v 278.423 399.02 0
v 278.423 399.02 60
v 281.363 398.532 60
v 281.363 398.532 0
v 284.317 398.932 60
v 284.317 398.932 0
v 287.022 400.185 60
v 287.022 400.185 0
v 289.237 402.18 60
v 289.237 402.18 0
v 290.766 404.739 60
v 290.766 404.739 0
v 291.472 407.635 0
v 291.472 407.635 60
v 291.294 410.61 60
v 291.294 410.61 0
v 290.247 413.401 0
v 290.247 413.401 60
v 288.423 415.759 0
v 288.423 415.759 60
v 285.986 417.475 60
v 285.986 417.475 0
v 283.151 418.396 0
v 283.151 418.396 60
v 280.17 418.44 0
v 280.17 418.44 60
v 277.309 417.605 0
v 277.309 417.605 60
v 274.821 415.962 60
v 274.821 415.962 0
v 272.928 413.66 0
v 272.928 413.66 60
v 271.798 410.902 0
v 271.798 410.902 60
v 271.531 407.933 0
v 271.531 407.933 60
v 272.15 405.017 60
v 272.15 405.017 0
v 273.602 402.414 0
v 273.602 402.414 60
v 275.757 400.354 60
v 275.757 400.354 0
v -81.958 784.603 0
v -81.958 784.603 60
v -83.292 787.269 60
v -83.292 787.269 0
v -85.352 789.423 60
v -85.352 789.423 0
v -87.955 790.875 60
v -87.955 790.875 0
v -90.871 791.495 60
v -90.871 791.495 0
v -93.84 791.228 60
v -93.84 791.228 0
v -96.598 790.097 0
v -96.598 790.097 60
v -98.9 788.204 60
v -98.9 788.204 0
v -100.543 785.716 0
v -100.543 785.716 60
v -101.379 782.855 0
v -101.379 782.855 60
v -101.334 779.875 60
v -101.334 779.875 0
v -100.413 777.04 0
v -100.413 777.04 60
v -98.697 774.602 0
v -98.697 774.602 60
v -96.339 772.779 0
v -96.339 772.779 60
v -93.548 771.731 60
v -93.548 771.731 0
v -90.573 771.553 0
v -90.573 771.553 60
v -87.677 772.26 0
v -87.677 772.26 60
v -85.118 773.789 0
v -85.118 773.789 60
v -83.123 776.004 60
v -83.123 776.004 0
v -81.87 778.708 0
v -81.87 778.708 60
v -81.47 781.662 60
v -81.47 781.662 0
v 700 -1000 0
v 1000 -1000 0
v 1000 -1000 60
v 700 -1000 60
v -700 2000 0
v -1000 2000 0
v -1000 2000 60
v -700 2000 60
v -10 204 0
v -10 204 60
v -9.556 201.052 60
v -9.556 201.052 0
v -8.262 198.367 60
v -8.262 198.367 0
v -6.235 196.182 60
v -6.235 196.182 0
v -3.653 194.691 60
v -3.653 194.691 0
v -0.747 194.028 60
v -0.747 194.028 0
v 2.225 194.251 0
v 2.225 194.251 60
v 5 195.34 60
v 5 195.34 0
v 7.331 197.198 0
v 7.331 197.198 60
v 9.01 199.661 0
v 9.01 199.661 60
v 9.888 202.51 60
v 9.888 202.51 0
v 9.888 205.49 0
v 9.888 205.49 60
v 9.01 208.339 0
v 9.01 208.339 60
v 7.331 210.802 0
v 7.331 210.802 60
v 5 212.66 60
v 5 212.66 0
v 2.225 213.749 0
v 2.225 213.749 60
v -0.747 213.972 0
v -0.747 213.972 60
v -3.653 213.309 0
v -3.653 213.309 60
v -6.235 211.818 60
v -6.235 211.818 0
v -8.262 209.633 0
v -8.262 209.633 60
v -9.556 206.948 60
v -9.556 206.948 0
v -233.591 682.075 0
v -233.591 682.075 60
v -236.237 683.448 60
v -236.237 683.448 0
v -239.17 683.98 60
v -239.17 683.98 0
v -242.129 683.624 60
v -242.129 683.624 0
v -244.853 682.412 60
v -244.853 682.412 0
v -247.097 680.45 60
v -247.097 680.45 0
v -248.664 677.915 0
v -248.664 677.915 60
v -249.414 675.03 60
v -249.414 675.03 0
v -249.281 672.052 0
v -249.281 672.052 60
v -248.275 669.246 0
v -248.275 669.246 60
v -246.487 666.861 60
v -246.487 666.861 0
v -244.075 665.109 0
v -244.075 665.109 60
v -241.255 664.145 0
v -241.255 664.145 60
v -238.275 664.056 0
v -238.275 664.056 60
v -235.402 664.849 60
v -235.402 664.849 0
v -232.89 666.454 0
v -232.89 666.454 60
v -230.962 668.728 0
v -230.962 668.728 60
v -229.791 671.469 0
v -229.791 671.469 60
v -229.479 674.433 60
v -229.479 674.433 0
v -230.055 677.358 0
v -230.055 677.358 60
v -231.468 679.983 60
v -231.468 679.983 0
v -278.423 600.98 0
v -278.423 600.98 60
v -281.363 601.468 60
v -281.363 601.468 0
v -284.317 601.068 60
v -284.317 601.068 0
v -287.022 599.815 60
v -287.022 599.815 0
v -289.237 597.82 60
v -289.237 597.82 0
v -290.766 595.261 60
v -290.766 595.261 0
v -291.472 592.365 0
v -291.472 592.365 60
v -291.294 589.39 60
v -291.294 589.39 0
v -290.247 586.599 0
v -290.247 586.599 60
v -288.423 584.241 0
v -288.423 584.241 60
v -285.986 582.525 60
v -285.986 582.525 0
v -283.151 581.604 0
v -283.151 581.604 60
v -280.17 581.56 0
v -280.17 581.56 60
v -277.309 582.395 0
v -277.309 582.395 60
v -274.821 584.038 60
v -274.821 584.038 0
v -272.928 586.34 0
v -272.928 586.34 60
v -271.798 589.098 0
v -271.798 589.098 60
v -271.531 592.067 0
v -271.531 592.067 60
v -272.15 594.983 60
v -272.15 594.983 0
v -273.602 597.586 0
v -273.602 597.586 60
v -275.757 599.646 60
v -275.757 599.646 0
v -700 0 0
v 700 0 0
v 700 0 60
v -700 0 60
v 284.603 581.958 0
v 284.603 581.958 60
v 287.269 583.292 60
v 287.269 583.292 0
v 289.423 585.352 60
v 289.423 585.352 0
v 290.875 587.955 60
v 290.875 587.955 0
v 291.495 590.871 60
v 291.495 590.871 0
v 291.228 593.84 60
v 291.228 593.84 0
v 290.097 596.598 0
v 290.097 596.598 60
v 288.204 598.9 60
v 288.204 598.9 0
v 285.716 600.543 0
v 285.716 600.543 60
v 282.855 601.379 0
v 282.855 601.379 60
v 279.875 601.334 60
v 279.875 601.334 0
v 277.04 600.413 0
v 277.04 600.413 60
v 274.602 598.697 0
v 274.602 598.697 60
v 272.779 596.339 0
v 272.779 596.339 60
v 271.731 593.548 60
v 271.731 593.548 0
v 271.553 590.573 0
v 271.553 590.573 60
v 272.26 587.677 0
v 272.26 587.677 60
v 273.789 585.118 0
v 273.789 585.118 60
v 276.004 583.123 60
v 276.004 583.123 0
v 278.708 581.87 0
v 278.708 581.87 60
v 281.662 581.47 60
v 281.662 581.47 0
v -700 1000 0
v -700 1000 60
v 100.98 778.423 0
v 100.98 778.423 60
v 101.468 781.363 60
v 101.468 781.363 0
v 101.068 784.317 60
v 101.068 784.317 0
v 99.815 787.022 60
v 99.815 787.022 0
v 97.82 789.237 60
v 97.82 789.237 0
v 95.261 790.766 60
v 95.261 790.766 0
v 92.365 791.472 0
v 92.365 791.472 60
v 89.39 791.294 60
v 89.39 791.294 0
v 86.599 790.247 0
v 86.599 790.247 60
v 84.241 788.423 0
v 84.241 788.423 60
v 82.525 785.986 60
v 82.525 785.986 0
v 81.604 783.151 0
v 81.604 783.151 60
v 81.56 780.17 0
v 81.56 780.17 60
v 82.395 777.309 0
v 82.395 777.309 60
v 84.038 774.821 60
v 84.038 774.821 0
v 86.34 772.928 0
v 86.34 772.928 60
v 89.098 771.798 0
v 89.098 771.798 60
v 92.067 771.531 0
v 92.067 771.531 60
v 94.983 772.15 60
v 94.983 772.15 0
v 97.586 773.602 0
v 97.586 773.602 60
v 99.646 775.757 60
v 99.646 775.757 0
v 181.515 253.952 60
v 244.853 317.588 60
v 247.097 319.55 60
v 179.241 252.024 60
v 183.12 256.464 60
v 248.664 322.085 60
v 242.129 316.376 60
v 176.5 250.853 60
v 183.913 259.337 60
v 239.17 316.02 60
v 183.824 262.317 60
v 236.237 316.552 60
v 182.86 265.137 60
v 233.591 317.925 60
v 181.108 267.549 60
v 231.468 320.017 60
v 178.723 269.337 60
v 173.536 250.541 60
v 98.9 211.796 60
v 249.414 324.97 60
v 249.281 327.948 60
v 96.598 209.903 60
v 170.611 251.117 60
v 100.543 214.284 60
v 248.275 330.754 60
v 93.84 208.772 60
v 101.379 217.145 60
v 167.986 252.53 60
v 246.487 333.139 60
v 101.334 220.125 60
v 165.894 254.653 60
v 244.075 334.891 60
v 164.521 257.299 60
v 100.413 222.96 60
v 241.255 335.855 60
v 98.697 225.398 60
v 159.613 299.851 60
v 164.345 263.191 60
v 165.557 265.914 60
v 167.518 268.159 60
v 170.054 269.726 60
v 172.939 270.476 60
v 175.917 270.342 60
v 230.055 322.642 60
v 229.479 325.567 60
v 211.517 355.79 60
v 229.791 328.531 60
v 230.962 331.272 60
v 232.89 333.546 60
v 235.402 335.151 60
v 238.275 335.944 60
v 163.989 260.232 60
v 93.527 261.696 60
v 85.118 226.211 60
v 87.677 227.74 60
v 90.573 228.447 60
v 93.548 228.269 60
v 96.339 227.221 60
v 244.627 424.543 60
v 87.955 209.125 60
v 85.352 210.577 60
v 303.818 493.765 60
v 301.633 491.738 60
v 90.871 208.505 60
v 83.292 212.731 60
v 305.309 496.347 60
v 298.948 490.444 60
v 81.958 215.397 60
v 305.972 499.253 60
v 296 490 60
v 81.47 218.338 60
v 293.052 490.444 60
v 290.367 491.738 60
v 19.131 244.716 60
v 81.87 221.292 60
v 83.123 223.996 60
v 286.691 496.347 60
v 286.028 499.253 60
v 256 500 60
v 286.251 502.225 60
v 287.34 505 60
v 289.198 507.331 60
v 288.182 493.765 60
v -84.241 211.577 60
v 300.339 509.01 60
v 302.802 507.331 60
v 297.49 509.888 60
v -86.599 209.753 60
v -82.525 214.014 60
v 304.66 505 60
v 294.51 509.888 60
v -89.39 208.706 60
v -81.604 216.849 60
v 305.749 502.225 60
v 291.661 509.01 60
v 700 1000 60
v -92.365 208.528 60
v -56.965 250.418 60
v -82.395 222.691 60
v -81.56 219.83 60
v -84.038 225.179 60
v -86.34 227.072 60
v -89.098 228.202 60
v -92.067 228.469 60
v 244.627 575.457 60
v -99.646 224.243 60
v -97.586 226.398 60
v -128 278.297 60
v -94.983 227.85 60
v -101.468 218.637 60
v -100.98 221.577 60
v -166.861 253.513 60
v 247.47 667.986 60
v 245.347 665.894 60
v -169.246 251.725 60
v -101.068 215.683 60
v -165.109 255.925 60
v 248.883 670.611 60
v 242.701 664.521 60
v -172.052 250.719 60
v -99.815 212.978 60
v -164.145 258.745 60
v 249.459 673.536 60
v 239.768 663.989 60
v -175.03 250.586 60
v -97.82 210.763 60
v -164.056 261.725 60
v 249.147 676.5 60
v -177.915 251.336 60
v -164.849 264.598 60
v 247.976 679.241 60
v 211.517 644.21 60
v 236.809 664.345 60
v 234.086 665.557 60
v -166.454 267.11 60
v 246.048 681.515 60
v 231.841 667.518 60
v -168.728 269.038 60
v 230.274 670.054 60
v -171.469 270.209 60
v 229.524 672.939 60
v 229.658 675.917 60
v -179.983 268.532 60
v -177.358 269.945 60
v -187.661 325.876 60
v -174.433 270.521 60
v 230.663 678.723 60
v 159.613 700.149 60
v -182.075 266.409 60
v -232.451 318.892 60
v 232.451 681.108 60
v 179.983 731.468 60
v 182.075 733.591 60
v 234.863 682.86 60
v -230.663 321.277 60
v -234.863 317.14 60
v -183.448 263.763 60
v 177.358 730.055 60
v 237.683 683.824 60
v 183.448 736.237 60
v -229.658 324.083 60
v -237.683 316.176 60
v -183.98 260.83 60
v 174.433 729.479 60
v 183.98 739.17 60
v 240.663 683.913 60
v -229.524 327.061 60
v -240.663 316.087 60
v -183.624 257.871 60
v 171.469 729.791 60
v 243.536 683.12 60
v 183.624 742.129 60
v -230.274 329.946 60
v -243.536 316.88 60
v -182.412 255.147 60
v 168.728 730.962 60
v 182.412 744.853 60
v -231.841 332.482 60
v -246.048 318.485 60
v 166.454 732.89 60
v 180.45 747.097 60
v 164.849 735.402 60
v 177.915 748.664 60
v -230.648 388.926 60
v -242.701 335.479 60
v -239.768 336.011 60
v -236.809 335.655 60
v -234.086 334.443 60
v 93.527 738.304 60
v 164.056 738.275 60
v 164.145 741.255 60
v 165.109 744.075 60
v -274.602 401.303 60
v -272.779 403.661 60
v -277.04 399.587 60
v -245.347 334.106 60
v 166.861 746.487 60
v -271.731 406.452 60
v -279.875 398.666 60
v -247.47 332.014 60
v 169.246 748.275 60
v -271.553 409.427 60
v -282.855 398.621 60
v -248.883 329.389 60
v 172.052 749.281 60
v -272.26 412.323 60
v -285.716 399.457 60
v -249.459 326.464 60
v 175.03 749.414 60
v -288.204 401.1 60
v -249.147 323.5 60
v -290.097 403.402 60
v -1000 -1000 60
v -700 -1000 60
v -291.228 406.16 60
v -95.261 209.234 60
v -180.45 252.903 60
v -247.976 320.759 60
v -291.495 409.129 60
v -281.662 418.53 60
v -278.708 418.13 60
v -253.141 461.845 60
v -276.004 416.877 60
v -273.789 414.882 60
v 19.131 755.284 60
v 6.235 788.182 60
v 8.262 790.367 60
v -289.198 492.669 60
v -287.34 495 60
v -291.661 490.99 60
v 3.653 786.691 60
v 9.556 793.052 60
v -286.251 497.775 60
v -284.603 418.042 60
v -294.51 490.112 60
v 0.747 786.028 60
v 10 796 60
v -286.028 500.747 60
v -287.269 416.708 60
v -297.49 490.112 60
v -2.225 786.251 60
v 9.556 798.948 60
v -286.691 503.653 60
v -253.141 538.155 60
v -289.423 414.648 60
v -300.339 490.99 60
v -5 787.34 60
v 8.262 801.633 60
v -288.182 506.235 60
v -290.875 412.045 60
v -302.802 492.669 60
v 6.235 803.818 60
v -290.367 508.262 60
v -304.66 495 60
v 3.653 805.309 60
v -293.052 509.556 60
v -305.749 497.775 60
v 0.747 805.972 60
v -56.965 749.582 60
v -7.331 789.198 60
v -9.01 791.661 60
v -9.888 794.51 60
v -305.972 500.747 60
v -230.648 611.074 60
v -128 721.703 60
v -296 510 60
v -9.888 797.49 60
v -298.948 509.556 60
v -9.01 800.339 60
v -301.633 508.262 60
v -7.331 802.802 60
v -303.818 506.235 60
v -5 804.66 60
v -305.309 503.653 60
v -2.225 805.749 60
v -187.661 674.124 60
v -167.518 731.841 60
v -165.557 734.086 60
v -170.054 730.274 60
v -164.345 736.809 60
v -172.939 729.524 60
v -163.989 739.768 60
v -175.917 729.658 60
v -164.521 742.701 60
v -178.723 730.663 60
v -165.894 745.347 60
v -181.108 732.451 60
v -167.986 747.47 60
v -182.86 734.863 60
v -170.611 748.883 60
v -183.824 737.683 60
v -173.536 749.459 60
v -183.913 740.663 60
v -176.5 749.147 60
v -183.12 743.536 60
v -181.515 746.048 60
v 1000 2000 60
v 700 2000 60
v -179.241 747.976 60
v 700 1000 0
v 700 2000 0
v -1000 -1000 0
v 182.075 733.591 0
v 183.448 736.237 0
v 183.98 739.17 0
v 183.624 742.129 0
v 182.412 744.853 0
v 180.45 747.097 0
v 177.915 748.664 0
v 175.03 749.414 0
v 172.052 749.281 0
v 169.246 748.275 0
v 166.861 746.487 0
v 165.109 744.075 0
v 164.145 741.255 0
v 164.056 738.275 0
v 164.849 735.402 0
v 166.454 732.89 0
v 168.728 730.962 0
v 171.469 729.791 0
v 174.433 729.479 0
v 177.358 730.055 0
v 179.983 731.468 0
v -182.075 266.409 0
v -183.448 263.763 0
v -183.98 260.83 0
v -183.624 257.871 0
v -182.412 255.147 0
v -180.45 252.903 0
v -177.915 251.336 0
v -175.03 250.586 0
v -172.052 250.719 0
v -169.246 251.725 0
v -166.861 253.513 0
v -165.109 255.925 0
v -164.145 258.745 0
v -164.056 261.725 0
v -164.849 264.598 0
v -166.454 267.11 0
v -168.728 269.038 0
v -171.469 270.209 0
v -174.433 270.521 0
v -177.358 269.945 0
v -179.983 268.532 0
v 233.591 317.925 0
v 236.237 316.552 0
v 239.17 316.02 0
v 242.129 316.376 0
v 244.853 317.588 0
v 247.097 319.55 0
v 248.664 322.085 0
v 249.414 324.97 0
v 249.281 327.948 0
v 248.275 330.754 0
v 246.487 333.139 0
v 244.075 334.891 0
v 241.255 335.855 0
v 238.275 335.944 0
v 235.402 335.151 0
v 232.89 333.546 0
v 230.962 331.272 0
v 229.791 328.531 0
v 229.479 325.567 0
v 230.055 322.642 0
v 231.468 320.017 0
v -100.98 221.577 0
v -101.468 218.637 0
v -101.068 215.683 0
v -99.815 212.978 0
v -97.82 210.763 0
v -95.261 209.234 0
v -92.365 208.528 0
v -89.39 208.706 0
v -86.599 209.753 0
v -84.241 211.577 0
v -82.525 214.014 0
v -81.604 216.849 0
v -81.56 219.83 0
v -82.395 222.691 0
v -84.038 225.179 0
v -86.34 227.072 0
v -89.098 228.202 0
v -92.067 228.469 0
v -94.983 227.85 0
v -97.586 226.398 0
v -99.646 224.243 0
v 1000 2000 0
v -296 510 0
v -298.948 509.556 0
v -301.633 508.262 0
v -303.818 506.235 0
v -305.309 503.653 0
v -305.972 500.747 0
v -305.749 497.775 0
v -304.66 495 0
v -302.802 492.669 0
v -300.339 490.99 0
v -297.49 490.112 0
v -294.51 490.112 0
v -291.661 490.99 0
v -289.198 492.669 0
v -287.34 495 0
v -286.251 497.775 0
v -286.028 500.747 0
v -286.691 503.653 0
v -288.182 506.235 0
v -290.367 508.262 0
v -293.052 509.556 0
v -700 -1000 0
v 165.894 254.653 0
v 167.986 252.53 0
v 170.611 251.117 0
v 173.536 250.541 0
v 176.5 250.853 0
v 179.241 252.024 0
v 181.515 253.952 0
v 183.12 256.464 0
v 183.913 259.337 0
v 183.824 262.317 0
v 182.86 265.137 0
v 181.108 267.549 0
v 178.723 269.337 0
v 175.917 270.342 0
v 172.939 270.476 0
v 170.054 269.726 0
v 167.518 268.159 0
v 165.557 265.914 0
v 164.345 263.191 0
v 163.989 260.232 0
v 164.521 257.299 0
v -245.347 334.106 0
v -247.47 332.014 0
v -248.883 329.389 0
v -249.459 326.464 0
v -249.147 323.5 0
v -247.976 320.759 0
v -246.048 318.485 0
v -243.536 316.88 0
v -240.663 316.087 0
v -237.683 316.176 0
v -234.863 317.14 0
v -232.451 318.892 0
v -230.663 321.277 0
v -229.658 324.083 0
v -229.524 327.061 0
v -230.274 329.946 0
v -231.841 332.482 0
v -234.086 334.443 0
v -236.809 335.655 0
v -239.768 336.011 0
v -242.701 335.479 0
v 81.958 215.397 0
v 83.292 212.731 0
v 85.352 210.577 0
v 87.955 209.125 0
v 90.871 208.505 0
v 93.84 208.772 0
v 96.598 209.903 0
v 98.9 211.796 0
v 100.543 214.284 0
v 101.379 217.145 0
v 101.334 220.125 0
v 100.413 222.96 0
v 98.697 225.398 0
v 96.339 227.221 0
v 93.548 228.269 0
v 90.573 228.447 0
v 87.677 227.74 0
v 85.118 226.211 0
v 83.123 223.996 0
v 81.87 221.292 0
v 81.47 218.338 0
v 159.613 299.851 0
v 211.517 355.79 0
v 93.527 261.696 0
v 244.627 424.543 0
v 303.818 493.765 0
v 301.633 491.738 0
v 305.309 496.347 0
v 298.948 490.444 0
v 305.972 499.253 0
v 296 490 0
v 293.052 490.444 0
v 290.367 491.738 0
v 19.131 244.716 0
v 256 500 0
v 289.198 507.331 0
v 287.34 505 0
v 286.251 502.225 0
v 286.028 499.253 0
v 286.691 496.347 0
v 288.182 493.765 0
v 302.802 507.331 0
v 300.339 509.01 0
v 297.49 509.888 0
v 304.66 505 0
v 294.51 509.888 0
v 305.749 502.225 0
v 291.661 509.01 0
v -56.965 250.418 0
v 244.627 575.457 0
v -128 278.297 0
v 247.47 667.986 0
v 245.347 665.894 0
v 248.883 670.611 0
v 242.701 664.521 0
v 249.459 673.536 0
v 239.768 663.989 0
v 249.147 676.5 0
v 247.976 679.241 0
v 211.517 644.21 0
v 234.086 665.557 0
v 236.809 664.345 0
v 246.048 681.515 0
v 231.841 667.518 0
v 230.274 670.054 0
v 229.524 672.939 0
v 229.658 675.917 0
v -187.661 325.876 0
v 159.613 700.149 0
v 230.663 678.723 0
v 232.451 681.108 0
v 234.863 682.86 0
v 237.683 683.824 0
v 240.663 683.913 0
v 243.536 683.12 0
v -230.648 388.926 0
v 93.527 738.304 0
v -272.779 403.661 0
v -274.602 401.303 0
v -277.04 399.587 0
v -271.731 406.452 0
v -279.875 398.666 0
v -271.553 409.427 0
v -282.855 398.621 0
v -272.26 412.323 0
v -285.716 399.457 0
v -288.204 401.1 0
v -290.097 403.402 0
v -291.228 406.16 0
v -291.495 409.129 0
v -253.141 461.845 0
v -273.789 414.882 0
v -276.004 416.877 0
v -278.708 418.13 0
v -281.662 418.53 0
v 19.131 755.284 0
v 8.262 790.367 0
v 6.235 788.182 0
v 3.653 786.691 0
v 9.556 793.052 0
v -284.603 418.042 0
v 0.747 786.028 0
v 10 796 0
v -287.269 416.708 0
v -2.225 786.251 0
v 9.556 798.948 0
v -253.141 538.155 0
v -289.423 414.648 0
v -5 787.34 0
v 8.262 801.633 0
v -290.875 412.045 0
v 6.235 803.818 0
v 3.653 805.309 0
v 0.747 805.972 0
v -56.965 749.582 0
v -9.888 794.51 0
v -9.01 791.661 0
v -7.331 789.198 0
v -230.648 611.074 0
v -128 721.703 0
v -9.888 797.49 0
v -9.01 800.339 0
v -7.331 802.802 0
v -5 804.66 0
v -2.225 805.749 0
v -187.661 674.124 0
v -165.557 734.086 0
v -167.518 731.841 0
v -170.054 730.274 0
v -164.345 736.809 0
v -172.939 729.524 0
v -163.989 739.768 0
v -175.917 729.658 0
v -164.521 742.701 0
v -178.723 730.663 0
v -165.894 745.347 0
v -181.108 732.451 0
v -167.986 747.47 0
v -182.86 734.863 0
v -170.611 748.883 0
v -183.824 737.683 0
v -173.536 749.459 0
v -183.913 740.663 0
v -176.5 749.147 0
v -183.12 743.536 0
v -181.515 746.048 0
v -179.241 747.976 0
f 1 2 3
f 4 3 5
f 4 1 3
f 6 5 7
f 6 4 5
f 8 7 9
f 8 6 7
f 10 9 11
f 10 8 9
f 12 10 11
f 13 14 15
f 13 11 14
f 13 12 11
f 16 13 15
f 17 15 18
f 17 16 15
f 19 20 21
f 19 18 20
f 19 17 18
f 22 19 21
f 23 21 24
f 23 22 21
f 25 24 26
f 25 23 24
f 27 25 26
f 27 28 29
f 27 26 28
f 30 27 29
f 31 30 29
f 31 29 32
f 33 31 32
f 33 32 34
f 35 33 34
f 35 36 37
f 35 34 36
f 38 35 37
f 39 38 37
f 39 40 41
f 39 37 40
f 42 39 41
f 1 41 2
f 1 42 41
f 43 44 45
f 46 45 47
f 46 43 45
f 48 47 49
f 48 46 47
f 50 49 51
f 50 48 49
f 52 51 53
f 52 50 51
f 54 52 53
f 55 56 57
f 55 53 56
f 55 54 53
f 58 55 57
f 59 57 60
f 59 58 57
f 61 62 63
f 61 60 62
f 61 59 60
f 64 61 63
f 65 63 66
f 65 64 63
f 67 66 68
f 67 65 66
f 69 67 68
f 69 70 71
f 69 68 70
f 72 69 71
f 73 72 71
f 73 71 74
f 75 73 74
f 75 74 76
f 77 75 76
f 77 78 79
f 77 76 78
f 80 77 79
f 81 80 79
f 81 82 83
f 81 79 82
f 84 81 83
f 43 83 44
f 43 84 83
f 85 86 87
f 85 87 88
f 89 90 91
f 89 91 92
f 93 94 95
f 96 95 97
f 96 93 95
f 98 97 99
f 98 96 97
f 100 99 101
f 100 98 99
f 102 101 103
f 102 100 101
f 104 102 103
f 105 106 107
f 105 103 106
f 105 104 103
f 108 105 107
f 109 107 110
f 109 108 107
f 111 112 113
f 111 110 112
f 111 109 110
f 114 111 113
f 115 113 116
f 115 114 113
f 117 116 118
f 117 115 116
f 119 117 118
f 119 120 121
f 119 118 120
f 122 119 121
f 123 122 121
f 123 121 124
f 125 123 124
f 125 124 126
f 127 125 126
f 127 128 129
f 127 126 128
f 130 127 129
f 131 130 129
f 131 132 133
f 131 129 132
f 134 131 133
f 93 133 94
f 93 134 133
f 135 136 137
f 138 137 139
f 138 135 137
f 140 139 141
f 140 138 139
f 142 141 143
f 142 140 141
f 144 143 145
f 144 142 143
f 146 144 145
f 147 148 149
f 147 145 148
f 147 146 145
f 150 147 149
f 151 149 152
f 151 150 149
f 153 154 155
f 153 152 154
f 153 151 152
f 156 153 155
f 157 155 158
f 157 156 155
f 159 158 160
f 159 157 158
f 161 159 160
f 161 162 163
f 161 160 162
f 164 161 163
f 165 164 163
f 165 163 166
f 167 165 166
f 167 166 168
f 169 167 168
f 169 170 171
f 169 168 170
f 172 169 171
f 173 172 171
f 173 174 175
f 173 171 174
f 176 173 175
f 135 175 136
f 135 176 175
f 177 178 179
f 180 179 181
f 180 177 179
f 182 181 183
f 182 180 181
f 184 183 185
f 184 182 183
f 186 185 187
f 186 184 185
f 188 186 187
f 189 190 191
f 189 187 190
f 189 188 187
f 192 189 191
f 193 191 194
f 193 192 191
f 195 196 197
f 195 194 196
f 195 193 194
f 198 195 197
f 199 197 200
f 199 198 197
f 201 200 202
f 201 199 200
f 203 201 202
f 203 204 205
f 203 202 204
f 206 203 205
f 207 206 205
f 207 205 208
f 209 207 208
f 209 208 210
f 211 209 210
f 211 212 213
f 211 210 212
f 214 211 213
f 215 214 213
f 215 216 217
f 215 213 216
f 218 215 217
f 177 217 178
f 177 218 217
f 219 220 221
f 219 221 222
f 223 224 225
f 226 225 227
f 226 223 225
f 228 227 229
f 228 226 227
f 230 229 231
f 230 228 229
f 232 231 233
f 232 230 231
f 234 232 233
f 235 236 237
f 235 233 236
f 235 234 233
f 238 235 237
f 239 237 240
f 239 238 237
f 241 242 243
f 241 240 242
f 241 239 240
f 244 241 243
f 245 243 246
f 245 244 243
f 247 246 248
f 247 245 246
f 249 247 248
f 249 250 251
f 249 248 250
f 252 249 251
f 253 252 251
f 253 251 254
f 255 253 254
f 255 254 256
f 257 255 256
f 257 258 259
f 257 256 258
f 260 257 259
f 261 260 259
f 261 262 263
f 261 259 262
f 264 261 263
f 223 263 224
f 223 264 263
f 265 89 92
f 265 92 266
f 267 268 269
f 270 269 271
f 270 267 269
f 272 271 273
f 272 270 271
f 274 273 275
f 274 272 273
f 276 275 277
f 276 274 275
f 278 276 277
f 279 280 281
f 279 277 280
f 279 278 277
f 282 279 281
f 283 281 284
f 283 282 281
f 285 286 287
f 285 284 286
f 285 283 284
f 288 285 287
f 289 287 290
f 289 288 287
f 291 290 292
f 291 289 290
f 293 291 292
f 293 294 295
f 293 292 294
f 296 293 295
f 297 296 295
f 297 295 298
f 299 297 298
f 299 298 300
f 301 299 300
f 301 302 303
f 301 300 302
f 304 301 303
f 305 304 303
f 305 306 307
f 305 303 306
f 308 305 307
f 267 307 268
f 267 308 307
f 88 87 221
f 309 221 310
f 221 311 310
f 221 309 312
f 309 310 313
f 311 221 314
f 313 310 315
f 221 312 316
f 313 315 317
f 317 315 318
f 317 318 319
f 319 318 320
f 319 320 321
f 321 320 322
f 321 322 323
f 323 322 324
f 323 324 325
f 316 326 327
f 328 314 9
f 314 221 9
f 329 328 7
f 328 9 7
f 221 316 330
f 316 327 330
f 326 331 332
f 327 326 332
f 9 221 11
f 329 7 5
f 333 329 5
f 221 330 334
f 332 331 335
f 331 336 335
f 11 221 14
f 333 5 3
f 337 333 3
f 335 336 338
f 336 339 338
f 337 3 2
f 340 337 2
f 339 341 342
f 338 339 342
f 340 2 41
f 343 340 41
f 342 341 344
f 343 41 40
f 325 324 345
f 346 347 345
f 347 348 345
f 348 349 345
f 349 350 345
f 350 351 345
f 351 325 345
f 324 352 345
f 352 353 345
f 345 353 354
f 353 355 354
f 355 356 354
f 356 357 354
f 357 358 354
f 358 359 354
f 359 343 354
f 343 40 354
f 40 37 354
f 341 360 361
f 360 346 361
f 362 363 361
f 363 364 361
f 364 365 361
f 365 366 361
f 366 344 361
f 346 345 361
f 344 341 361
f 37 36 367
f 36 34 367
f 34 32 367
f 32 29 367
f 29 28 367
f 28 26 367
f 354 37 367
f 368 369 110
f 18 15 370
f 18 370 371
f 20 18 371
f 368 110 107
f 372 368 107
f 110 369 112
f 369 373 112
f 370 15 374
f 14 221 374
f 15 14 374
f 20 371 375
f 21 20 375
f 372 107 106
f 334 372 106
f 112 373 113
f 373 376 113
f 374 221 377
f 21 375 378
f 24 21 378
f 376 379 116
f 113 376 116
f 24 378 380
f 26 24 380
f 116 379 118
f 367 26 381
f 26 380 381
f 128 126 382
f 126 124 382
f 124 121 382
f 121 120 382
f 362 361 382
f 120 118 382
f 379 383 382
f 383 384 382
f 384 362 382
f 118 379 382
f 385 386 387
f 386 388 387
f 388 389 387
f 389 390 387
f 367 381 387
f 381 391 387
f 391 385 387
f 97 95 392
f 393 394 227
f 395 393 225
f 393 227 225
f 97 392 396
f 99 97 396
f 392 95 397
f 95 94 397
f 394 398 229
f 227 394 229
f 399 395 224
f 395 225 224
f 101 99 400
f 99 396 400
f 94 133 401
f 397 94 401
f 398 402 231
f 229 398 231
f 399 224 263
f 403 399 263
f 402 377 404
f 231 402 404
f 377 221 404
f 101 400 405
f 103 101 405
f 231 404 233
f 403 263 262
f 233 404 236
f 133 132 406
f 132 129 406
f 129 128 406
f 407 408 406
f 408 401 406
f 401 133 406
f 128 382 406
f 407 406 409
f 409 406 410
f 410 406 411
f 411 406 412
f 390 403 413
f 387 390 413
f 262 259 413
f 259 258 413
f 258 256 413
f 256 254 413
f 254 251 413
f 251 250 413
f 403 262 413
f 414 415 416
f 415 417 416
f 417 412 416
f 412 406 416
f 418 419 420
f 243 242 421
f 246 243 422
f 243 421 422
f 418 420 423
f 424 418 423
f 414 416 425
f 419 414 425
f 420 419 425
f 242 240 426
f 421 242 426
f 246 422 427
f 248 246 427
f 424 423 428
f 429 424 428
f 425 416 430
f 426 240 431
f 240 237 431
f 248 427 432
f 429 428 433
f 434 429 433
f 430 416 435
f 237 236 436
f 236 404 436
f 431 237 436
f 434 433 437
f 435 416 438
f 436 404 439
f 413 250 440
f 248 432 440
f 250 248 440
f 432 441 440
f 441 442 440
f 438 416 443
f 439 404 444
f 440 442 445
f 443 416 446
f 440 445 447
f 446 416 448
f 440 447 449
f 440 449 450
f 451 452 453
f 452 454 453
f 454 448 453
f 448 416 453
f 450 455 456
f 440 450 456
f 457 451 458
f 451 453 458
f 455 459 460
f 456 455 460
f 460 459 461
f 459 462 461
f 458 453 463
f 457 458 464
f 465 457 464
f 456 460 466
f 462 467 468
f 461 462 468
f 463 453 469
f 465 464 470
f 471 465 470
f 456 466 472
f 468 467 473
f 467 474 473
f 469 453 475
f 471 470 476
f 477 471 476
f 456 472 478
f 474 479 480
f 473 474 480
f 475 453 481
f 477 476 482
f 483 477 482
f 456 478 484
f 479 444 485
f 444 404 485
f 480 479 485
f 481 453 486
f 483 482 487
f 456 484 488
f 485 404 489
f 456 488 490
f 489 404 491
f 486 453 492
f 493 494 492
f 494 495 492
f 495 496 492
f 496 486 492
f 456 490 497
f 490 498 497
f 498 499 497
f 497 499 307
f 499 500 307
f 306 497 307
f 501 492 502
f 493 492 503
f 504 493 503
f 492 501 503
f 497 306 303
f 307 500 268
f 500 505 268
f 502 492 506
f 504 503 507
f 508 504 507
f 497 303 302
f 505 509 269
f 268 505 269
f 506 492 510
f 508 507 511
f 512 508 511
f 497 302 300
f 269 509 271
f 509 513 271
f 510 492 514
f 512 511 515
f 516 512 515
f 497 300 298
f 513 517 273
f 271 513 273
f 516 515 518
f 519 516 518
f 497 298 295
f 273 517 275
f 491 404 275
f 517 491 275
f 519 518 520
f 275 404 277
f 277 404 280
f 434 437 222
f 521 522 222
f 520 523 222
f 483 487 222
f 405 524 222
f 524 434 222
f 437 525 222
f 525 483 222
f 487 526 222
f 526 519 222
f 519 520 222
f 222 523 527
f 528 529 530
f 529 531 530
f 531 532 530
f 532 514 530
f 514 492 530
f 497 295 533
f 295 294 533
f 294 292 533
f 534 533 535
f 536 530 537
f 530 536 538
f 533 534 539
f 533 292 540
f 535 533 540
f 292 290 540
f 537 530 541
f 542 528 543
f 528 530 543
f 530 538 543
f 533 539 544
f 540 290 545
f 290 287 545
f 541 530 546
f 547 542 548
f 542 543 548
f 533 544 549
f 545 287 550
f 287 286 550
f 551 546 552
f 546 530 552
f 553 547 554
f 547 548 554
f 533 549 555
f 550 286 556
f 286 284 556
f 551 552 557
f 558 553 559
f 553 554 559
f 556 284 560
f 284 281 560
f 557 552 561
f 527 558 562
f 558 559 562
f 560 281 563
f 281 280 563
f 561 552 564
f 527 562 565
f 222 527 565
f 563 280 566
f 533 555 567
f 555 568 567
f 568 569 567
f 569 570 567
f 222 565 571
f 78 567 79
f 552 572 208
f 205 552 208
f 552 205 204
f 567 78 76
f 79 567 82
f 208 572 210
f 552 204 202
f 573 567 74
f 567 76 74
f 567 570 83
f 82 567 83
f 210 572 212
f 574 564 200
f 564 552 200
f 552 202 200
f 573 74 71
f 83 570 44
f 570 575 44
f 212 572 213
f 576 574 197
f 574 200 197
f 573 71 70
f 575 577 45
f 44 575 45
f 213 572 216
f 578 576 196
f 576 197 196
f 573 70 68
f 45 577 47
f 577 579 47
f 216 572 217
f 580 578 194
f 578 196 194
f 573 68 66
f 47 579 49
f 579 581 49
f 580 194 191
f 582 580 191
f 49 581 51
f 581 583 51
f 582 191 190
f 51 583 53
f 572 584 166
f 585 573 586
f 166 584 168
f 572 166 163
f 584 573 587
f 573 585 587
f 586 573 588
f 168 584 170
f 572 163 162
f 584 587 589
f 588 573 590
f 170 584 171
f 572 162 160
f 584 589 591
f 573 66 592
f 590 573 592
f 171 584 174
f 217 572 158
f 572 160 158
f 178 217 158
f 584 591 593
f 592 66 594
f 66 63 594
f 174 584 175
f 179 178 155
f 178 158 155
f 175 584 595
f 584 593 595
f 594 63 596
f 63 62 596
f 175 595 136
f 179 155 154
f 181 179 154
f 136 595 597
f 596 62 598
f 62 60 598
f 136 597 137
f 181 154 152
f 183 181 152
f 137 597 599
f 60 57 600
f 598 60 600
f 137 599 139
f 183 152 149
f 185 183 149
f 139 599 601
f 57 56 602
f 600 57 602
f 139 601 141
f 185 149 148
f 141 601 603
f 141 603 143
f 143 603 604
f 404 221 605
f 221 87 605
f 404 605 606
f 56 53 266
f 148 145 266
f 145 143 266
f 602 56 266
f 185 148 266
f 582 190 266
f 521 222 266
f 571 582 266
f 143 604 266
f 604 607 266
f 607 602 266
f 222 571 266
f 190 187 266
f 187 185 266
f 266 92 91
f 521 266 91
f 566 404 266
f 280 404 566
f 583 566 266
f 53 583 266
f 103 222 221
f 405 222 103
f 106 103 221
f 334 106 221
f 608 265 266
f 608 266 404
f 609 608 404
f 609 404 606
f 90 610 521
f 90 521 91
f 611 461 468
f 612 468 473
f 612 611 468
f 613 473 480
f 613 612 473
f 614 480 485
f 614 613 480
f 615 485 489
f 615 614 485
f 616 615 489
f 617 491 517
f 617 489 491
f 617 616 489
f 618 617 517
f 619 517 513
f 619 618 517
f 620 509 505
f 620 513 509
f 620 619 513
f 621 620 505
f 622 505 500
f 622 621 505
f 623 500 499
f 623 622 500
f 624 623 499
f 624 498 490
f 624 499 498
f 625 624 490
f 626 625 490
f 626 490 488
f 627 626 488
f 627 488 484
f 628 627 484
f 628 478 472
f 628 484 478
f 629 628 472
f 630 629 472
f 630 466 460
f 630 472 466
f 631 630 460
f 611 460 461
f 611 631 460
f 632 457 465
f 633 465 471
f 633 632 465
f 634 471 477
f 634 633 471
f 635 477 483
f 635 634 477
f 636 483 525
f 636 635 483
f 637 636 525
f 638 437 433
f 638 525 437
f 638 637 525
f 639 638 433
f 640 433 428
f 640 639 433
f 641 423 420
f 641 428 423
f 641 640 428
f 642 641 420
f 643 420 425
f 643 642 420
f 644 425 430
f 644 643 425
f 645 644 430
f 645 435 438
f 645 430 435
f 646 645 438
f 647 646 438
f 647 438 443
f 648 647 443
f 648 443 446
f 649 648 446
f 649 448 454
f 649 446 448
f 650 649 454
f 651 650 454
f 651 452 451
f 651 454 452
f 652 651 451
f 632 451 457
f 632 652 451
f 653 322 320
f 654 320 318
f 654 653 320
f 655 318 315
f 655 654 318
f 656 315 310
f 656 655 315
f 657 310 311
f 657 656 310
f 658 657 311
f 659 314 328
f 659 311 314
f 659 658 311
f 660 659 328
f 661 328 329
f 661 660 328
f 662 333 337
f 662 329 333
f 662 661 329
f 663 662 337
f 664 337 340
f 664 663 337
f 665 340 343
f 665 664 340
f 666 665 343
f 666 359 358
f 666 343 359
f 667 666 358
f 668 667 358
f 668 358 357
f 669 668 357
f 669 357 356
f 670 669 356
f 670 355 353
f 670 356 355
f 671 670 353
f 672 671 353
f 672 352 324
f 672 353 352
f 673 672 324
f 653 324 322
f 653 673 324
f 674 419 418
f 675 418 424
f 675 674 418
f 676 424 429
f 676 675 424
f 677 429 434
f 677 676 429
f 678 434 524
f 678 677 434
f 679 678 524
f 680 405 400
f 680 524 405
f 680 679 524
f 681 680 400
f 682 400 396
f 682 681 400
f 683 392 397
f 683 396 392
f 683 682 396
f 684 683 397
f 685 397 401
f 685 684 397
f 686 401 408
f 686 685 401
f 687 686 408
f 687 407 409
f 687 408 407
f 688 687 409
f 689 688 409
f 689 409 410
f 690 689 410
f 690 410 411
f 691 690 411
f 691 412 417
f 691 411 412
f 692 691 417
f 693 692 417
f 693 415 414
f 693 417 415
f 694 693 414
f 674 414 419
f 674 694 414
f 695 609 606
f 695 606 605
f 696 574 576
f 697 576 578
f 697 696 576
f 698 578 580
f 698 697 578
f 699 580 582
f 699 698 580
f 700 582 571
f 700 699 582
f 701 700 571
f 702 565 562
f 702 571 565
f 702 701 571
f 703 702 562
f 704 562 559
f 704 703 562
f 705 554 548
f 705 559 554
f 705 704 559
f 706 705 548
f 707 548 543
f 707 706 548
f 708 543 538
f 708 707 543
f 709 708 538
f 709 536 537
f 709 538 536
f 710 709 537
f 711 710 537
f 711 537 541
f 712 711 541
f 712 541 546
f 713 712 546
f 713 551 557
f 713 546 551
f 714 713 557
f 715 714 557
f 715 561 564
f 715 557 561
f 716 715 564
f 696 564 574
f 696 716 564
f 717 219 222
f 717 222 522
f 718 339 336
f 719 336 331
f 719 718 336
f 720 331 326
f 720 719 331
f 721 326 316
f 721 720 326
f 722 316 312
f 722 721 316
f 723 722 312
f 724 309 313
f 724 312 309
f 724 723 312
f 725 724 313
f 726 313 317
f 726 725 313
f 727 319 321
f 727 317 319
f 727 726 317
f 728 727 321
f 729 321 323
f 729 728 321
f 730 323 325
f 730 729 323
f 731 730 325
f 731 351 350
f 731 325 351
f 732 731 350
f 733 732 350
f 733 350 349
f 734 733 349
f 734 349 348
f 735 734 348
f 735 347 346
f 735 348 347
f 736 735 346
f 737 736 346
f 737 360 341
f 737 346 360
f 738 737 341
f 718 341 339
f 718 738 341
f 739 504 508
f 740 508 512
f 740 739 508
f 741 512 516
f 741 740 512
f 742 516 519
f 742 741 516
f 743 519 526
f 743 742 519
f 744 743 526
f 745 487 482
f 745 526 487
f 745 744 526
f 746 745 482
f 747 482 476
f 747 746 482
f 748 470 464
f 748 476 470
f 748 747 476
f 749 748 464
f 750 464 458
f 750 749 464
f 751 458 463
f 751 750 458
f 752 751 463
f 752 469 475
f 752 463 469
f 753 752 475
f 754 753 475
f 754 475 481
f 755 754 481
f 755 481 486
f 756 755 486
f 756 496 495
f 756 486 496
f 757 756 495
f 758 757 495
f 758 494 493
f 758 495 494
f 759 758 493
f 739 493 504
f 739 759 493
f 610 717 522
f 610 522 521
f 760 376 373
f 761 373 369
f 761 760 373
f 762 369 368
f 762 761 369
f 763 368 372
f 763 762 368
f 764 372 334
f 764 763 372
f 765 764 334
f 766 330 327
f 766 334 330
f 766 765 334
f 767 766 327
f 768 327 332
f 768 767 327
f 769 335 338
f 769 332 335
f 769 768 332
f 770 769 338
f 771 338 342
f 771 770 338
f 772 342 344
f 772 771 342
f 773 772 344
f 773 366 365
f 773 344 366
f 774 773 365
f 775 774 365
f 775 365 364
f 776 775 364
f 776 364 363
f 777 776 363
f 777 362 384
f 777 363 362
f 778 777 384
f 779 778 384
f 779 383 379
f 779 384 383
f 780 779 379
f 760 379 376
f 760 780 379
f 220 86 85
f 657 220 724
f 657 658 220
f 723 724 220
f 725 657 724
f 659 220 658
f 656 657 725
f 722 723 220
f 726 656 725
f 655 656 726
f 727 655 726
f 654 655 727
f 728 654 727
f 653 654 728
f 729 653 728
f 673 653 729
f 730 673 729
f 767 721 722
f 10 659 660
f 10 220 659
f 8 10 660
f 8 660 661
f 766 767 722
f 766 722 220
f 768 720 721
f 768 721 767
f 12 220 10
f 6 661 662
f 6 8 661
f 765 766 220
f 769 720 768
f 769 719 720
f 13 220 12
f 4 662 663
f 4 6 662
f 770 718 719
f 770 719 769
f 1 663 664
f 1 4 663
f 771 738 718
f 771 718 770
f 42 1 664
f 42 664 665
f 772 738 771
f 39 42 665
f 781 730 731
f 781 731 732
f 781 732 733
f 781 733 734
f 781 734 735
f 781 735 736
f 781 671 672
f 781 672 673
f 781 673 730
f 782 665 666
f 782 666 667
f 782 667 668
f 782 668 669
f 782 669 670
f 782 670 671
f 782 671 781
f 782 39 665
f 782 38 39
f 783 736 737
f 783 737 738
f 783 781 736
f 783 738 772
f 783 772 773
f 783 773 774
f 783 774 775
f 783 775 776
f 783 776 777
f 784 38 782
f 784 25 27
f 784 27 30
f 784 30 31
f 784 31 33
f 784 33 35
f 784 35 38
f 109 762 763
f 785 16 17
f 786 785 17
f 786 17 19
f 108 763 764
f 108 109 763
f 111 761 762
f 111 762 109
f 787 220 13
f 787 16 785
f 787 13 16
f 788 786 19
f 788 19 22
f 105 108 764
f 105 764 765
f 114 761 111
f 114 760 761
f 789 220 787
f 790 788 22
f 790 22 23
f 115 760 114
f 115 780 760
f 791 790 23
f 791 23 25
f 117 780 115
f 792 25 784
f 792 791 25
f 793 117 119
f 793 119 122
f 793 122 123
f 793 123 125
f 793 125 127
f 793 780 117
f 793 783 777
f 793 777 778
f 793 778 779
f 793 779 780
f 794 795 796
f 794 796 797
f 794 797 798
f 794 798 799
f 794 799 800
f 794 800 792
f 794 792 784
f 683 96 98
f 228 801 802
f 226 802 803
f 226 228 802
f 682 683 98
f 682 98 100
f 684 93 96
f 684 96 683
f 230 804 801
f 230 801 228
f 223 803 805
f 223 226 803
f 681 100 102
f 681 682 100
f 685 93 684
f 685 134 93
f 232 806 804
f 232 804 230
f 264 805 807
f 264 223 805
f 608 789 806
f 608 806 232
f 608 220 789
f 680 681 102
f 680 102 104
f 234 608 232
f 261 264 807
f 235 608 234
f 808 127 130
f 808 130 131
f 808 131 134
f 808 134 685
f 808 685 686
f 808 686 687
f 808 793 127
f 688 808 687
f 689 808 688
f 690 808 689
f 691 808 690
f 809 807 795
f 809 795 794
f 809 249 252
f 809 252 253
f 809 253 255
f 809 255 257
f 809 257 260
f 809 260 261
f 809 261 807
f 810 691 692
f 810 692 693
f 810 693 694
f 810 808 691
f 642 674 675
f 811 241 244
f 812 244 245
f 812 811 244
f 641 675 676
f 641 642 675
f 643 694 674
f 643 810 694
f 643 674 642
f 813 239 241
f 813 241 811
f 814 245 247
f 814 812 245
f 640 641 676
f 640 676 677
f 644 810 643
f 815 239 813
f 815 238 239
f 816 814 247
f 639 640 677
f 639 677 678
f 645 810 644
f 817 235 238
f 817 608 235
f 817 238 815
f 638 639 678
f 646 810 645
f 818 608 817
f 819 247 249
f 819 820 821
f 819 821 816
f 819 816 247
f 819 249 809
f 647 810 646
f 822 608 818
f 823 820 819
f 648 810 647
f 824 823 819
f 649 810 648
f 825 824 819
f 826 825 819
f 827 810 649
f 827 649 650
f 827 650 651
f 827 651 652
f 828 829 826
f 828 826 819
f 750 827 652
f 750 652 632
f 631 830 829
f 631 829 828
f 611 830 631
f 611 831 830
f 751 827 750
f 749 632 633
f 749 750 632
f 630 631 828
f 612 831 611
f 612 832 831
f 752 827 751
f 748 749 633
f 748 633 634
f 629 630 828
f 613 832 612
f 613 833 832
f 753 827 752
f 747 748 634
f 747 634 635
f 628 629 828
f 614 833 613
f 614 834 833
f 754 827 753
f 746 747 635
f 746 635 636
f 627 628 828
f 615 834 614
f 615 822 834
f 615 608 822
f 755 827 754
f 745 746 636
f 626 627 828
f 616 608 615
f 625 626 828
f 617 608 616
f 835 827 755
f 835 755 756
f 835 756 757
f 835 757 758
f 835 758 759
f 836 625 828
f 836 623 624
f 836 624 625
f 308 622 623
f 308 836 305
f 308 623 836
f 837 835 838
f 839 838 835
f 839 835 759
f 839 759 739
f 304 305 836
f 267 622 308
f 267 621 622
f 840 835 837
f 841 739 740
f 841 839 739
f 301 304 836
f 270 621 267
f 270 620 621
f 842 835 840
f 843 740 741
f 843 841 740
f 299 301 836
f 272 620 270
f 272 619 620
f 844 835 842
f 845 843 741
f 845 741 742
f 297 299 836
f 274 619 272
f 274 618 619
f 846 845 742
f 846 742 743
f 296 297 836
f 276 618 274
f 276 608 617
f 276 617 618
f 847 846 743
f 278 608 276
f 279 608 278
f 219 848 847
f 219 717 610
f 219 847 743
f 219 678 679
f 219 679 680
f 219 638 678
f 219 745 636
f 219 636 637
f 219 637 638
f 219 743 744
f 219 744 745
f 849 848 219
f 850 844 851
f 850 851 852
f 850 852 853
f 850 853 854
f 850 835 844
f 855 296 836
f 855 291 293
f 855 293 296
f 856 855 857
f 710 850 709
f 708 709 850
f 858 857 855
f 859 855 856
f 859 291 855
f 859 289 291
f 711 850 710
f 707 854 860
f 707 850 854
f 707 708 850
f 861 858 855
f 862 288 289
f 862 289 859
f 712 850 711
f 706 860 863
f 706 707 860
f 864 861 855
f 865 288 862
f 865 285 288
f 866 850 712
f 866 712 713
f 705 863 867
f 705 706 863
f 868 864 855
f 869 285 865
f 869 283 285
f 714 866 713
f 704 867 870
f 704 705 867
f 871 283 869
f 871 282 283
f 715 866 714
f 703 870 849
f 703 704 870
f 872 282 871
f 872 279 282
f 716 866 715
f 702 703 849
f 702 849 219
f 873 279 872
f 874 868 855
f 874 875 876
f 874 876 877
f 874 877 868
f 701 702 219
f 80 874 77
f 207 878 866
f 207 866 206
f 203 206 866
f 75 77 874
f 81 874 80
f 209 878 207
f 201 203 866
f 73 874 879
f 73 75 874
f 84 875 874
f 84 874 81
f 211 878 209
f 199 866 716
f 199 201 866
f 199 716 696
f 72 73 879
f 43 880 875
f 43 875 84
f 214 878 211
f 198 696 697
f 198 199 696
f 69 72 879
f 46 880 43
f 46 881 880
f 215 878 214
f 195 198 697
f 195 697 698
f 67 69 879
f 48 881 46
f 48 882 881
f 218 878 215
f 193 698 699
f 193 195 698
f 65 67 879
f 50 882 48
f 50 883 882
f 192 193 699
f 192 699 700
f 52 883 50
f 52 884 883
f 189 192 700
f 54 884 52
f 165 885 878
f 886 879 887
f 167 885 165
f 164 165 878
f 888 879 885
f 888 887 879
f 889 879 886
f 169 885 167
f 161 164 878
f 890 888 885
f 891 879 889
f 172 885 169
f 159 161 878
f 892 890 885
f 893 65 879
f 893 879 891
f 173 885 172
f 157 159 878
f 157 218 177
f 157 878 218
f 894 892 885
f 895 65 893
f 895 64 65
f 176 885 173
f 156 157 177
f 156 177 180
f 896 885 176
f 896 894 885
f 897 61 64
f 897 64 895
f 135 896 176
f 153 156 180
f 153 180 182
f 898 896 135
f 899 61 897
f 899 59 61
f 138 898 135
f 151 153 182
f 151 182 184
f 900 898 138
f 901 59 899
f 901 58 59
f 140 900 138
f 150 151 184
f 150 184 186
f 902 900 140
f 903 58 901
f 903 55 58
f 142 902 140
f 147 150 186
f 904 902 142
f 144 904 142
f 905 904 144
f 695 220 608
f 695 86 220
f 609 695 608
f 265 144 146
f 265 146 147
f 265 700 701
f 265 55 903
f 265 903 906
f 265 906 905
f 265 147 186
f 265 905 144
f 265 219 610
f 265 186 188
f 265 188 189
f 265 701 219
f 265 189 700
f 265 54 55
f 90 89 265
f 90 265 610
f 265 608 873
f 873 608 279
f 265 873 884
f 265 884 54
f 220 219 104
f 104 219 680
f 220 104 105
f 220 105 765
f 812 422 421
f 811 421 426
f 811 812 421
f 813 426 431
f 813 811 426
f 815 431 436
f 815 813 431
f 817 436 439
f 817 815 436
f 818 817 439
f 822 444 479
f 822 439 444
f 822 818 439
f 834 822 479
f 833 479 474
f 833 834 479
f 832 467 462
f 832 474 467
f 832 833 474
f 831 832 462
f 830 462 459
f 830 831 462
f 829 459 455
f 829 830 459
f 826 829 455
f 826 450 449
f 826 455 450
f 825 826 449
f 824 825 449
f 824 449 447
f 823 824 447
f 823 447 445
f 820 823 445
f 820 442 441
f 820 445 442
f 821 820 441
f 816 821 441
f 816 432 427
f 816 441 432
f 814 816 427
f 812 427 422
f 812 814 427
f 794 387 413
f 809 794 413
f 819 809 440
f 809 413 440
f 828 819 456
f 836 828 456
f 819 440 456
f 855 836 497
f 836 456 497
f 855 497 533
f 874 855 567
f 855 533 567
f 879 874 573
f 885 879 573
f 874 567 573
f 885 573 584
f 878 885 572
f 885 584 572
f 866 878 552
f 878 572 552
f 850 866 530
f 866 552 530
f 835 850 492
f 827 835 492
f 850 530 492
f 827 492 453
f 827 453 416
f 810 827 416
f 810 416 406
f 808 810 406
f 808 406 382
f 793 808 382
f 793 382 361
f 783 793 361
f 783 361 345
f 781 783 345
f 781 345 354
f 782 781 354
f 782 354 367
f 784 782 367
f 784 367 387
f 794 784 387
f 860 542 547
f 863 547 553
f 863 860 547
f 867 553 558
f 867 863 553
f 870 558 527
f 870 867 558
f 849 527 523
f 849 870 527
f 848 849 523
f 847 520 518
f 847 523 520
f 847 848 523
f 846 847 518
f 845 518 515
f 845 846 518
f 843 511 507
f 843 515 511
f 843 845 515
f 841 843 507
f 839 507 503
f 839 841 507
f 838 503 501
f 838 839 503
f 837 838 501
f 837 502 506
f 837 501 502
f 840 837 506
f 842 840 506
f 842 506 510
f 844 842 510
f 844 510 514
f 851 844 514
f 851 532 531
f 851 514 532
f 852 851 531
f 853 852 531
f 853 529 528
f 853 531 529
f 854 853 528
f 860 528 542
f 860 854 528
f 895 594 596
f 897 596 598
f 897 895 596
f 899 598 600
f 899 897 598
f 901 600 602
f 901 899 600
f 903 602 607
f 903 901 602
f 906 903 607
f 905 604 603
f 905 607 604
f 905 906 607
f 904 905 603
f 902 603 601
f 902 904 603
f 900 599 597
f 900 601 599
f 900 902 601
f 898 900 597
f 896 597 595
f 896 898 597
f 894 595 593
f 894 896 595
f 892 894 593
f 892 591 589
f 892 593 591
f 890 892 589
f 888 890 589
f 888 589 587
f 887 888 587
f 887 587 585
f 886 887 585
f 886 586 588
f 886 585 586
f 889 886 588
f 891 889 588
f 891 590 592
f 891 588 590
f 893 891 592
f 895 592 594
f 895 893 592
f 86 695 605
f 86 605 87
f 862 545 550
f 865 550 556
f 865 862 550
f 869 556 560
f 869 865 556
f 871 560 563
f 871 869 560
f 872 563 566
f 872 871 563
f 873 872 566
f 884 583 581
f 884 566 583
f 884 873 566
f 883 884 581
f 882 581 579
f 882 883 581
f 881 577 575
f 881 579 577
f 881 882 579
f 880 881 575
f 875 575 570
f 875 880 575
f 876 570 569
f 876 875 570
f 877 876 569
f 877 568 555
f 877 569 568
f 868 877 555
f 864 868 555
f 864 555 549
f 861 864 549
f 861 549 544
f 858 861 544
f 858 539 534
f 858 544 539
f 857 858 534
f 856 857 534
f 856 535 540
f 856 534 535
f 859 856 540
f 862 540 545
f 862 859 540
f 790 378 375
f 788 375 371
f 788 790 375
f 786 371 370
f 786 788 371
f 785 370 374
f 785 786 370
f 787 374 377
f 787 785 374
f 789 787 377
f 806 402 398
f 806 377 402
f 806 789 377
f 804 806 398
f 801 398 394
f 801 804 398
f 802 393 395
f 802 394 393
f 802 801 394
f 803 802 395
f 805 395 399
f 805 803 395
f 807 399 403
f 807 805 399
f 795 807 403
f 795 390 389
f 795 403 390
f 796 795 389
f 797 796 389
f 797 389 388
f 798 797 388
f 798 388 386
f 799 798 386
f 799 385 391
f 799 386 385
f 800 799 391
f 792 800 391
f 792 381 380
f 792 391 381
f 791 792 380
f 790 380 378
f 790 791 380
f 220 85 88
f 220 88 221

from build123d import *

# Parameters (mm, degrees)
BOSS_EXTRU_1_DEPTH           = 60
ESQUISSE2_R                  = 256
ENL_V_MAT_EXTRU_1_DEPTH      = 2237.872817127
ESQUISSE5_R                  = 10
ENL_V_MAT_EXTRU_3_DEPTH      = 2237.872817127
R_P_TITION_CIRCULAIRE1_COUNT = 20


with BuildPart() as part:
    # Esquisse1 → Boss.-Extru.1 (new body)
    with BuildSketch(Plane.XY):
        Polygon((-1000, 2000), (-700, 2000), (-700, 1000), (700, 1000), (700, 2000), (1000, 2000), (1000, -1000), (700, -1000), (700, 0), (-700, 0), (-700, -1000), (-1000, -1000), align=None)
    extrude(amount=BOSS_EXTRU_1_DEPTH)

    # Esquisse2 → Enlèv. mat.-Extru.1 (cut, through all)
    with BuildSketch(Plane.XY.offset(60)):
        with Locations((0, 500)):
            Circle(ESQUISSE2_R)
    extrude(amount=-ENL_V_MAT_EXTRU_1_DEPTH, mode=Mode.SUBTRACT)

    # Esquisse5 → Enlèv. mat.-Extru.3 (cut, through all)
    with BuildSketch(Plane.XY):
        with Locations((0, 796)):
            Circle(ESQUISSE5_R)
    enl_v_mat_extru_3 = extrude(amount=ENL_V_MAT_EXTRU_3_DEPTH, mode=Mode.SUBTRACT)

    # Répétition circulaire1: Enlèv. mat.-Extru.3 ×20 about axis
    r_p_tition_circulaire1_axis = Axis((0, 500, 0), (0, 0, 1))
    for i in range(1, R_P_TITION_CIRCULAIRE1_COUNT):
        add(enl_v_mat_extru_3.rotate(r_p_tition_circulaire1_axis, i * 360 / R_P_TITION_CIRCULAIRE1_COUNT), mode=Mode.SUBTRACT)


solid = part.part
